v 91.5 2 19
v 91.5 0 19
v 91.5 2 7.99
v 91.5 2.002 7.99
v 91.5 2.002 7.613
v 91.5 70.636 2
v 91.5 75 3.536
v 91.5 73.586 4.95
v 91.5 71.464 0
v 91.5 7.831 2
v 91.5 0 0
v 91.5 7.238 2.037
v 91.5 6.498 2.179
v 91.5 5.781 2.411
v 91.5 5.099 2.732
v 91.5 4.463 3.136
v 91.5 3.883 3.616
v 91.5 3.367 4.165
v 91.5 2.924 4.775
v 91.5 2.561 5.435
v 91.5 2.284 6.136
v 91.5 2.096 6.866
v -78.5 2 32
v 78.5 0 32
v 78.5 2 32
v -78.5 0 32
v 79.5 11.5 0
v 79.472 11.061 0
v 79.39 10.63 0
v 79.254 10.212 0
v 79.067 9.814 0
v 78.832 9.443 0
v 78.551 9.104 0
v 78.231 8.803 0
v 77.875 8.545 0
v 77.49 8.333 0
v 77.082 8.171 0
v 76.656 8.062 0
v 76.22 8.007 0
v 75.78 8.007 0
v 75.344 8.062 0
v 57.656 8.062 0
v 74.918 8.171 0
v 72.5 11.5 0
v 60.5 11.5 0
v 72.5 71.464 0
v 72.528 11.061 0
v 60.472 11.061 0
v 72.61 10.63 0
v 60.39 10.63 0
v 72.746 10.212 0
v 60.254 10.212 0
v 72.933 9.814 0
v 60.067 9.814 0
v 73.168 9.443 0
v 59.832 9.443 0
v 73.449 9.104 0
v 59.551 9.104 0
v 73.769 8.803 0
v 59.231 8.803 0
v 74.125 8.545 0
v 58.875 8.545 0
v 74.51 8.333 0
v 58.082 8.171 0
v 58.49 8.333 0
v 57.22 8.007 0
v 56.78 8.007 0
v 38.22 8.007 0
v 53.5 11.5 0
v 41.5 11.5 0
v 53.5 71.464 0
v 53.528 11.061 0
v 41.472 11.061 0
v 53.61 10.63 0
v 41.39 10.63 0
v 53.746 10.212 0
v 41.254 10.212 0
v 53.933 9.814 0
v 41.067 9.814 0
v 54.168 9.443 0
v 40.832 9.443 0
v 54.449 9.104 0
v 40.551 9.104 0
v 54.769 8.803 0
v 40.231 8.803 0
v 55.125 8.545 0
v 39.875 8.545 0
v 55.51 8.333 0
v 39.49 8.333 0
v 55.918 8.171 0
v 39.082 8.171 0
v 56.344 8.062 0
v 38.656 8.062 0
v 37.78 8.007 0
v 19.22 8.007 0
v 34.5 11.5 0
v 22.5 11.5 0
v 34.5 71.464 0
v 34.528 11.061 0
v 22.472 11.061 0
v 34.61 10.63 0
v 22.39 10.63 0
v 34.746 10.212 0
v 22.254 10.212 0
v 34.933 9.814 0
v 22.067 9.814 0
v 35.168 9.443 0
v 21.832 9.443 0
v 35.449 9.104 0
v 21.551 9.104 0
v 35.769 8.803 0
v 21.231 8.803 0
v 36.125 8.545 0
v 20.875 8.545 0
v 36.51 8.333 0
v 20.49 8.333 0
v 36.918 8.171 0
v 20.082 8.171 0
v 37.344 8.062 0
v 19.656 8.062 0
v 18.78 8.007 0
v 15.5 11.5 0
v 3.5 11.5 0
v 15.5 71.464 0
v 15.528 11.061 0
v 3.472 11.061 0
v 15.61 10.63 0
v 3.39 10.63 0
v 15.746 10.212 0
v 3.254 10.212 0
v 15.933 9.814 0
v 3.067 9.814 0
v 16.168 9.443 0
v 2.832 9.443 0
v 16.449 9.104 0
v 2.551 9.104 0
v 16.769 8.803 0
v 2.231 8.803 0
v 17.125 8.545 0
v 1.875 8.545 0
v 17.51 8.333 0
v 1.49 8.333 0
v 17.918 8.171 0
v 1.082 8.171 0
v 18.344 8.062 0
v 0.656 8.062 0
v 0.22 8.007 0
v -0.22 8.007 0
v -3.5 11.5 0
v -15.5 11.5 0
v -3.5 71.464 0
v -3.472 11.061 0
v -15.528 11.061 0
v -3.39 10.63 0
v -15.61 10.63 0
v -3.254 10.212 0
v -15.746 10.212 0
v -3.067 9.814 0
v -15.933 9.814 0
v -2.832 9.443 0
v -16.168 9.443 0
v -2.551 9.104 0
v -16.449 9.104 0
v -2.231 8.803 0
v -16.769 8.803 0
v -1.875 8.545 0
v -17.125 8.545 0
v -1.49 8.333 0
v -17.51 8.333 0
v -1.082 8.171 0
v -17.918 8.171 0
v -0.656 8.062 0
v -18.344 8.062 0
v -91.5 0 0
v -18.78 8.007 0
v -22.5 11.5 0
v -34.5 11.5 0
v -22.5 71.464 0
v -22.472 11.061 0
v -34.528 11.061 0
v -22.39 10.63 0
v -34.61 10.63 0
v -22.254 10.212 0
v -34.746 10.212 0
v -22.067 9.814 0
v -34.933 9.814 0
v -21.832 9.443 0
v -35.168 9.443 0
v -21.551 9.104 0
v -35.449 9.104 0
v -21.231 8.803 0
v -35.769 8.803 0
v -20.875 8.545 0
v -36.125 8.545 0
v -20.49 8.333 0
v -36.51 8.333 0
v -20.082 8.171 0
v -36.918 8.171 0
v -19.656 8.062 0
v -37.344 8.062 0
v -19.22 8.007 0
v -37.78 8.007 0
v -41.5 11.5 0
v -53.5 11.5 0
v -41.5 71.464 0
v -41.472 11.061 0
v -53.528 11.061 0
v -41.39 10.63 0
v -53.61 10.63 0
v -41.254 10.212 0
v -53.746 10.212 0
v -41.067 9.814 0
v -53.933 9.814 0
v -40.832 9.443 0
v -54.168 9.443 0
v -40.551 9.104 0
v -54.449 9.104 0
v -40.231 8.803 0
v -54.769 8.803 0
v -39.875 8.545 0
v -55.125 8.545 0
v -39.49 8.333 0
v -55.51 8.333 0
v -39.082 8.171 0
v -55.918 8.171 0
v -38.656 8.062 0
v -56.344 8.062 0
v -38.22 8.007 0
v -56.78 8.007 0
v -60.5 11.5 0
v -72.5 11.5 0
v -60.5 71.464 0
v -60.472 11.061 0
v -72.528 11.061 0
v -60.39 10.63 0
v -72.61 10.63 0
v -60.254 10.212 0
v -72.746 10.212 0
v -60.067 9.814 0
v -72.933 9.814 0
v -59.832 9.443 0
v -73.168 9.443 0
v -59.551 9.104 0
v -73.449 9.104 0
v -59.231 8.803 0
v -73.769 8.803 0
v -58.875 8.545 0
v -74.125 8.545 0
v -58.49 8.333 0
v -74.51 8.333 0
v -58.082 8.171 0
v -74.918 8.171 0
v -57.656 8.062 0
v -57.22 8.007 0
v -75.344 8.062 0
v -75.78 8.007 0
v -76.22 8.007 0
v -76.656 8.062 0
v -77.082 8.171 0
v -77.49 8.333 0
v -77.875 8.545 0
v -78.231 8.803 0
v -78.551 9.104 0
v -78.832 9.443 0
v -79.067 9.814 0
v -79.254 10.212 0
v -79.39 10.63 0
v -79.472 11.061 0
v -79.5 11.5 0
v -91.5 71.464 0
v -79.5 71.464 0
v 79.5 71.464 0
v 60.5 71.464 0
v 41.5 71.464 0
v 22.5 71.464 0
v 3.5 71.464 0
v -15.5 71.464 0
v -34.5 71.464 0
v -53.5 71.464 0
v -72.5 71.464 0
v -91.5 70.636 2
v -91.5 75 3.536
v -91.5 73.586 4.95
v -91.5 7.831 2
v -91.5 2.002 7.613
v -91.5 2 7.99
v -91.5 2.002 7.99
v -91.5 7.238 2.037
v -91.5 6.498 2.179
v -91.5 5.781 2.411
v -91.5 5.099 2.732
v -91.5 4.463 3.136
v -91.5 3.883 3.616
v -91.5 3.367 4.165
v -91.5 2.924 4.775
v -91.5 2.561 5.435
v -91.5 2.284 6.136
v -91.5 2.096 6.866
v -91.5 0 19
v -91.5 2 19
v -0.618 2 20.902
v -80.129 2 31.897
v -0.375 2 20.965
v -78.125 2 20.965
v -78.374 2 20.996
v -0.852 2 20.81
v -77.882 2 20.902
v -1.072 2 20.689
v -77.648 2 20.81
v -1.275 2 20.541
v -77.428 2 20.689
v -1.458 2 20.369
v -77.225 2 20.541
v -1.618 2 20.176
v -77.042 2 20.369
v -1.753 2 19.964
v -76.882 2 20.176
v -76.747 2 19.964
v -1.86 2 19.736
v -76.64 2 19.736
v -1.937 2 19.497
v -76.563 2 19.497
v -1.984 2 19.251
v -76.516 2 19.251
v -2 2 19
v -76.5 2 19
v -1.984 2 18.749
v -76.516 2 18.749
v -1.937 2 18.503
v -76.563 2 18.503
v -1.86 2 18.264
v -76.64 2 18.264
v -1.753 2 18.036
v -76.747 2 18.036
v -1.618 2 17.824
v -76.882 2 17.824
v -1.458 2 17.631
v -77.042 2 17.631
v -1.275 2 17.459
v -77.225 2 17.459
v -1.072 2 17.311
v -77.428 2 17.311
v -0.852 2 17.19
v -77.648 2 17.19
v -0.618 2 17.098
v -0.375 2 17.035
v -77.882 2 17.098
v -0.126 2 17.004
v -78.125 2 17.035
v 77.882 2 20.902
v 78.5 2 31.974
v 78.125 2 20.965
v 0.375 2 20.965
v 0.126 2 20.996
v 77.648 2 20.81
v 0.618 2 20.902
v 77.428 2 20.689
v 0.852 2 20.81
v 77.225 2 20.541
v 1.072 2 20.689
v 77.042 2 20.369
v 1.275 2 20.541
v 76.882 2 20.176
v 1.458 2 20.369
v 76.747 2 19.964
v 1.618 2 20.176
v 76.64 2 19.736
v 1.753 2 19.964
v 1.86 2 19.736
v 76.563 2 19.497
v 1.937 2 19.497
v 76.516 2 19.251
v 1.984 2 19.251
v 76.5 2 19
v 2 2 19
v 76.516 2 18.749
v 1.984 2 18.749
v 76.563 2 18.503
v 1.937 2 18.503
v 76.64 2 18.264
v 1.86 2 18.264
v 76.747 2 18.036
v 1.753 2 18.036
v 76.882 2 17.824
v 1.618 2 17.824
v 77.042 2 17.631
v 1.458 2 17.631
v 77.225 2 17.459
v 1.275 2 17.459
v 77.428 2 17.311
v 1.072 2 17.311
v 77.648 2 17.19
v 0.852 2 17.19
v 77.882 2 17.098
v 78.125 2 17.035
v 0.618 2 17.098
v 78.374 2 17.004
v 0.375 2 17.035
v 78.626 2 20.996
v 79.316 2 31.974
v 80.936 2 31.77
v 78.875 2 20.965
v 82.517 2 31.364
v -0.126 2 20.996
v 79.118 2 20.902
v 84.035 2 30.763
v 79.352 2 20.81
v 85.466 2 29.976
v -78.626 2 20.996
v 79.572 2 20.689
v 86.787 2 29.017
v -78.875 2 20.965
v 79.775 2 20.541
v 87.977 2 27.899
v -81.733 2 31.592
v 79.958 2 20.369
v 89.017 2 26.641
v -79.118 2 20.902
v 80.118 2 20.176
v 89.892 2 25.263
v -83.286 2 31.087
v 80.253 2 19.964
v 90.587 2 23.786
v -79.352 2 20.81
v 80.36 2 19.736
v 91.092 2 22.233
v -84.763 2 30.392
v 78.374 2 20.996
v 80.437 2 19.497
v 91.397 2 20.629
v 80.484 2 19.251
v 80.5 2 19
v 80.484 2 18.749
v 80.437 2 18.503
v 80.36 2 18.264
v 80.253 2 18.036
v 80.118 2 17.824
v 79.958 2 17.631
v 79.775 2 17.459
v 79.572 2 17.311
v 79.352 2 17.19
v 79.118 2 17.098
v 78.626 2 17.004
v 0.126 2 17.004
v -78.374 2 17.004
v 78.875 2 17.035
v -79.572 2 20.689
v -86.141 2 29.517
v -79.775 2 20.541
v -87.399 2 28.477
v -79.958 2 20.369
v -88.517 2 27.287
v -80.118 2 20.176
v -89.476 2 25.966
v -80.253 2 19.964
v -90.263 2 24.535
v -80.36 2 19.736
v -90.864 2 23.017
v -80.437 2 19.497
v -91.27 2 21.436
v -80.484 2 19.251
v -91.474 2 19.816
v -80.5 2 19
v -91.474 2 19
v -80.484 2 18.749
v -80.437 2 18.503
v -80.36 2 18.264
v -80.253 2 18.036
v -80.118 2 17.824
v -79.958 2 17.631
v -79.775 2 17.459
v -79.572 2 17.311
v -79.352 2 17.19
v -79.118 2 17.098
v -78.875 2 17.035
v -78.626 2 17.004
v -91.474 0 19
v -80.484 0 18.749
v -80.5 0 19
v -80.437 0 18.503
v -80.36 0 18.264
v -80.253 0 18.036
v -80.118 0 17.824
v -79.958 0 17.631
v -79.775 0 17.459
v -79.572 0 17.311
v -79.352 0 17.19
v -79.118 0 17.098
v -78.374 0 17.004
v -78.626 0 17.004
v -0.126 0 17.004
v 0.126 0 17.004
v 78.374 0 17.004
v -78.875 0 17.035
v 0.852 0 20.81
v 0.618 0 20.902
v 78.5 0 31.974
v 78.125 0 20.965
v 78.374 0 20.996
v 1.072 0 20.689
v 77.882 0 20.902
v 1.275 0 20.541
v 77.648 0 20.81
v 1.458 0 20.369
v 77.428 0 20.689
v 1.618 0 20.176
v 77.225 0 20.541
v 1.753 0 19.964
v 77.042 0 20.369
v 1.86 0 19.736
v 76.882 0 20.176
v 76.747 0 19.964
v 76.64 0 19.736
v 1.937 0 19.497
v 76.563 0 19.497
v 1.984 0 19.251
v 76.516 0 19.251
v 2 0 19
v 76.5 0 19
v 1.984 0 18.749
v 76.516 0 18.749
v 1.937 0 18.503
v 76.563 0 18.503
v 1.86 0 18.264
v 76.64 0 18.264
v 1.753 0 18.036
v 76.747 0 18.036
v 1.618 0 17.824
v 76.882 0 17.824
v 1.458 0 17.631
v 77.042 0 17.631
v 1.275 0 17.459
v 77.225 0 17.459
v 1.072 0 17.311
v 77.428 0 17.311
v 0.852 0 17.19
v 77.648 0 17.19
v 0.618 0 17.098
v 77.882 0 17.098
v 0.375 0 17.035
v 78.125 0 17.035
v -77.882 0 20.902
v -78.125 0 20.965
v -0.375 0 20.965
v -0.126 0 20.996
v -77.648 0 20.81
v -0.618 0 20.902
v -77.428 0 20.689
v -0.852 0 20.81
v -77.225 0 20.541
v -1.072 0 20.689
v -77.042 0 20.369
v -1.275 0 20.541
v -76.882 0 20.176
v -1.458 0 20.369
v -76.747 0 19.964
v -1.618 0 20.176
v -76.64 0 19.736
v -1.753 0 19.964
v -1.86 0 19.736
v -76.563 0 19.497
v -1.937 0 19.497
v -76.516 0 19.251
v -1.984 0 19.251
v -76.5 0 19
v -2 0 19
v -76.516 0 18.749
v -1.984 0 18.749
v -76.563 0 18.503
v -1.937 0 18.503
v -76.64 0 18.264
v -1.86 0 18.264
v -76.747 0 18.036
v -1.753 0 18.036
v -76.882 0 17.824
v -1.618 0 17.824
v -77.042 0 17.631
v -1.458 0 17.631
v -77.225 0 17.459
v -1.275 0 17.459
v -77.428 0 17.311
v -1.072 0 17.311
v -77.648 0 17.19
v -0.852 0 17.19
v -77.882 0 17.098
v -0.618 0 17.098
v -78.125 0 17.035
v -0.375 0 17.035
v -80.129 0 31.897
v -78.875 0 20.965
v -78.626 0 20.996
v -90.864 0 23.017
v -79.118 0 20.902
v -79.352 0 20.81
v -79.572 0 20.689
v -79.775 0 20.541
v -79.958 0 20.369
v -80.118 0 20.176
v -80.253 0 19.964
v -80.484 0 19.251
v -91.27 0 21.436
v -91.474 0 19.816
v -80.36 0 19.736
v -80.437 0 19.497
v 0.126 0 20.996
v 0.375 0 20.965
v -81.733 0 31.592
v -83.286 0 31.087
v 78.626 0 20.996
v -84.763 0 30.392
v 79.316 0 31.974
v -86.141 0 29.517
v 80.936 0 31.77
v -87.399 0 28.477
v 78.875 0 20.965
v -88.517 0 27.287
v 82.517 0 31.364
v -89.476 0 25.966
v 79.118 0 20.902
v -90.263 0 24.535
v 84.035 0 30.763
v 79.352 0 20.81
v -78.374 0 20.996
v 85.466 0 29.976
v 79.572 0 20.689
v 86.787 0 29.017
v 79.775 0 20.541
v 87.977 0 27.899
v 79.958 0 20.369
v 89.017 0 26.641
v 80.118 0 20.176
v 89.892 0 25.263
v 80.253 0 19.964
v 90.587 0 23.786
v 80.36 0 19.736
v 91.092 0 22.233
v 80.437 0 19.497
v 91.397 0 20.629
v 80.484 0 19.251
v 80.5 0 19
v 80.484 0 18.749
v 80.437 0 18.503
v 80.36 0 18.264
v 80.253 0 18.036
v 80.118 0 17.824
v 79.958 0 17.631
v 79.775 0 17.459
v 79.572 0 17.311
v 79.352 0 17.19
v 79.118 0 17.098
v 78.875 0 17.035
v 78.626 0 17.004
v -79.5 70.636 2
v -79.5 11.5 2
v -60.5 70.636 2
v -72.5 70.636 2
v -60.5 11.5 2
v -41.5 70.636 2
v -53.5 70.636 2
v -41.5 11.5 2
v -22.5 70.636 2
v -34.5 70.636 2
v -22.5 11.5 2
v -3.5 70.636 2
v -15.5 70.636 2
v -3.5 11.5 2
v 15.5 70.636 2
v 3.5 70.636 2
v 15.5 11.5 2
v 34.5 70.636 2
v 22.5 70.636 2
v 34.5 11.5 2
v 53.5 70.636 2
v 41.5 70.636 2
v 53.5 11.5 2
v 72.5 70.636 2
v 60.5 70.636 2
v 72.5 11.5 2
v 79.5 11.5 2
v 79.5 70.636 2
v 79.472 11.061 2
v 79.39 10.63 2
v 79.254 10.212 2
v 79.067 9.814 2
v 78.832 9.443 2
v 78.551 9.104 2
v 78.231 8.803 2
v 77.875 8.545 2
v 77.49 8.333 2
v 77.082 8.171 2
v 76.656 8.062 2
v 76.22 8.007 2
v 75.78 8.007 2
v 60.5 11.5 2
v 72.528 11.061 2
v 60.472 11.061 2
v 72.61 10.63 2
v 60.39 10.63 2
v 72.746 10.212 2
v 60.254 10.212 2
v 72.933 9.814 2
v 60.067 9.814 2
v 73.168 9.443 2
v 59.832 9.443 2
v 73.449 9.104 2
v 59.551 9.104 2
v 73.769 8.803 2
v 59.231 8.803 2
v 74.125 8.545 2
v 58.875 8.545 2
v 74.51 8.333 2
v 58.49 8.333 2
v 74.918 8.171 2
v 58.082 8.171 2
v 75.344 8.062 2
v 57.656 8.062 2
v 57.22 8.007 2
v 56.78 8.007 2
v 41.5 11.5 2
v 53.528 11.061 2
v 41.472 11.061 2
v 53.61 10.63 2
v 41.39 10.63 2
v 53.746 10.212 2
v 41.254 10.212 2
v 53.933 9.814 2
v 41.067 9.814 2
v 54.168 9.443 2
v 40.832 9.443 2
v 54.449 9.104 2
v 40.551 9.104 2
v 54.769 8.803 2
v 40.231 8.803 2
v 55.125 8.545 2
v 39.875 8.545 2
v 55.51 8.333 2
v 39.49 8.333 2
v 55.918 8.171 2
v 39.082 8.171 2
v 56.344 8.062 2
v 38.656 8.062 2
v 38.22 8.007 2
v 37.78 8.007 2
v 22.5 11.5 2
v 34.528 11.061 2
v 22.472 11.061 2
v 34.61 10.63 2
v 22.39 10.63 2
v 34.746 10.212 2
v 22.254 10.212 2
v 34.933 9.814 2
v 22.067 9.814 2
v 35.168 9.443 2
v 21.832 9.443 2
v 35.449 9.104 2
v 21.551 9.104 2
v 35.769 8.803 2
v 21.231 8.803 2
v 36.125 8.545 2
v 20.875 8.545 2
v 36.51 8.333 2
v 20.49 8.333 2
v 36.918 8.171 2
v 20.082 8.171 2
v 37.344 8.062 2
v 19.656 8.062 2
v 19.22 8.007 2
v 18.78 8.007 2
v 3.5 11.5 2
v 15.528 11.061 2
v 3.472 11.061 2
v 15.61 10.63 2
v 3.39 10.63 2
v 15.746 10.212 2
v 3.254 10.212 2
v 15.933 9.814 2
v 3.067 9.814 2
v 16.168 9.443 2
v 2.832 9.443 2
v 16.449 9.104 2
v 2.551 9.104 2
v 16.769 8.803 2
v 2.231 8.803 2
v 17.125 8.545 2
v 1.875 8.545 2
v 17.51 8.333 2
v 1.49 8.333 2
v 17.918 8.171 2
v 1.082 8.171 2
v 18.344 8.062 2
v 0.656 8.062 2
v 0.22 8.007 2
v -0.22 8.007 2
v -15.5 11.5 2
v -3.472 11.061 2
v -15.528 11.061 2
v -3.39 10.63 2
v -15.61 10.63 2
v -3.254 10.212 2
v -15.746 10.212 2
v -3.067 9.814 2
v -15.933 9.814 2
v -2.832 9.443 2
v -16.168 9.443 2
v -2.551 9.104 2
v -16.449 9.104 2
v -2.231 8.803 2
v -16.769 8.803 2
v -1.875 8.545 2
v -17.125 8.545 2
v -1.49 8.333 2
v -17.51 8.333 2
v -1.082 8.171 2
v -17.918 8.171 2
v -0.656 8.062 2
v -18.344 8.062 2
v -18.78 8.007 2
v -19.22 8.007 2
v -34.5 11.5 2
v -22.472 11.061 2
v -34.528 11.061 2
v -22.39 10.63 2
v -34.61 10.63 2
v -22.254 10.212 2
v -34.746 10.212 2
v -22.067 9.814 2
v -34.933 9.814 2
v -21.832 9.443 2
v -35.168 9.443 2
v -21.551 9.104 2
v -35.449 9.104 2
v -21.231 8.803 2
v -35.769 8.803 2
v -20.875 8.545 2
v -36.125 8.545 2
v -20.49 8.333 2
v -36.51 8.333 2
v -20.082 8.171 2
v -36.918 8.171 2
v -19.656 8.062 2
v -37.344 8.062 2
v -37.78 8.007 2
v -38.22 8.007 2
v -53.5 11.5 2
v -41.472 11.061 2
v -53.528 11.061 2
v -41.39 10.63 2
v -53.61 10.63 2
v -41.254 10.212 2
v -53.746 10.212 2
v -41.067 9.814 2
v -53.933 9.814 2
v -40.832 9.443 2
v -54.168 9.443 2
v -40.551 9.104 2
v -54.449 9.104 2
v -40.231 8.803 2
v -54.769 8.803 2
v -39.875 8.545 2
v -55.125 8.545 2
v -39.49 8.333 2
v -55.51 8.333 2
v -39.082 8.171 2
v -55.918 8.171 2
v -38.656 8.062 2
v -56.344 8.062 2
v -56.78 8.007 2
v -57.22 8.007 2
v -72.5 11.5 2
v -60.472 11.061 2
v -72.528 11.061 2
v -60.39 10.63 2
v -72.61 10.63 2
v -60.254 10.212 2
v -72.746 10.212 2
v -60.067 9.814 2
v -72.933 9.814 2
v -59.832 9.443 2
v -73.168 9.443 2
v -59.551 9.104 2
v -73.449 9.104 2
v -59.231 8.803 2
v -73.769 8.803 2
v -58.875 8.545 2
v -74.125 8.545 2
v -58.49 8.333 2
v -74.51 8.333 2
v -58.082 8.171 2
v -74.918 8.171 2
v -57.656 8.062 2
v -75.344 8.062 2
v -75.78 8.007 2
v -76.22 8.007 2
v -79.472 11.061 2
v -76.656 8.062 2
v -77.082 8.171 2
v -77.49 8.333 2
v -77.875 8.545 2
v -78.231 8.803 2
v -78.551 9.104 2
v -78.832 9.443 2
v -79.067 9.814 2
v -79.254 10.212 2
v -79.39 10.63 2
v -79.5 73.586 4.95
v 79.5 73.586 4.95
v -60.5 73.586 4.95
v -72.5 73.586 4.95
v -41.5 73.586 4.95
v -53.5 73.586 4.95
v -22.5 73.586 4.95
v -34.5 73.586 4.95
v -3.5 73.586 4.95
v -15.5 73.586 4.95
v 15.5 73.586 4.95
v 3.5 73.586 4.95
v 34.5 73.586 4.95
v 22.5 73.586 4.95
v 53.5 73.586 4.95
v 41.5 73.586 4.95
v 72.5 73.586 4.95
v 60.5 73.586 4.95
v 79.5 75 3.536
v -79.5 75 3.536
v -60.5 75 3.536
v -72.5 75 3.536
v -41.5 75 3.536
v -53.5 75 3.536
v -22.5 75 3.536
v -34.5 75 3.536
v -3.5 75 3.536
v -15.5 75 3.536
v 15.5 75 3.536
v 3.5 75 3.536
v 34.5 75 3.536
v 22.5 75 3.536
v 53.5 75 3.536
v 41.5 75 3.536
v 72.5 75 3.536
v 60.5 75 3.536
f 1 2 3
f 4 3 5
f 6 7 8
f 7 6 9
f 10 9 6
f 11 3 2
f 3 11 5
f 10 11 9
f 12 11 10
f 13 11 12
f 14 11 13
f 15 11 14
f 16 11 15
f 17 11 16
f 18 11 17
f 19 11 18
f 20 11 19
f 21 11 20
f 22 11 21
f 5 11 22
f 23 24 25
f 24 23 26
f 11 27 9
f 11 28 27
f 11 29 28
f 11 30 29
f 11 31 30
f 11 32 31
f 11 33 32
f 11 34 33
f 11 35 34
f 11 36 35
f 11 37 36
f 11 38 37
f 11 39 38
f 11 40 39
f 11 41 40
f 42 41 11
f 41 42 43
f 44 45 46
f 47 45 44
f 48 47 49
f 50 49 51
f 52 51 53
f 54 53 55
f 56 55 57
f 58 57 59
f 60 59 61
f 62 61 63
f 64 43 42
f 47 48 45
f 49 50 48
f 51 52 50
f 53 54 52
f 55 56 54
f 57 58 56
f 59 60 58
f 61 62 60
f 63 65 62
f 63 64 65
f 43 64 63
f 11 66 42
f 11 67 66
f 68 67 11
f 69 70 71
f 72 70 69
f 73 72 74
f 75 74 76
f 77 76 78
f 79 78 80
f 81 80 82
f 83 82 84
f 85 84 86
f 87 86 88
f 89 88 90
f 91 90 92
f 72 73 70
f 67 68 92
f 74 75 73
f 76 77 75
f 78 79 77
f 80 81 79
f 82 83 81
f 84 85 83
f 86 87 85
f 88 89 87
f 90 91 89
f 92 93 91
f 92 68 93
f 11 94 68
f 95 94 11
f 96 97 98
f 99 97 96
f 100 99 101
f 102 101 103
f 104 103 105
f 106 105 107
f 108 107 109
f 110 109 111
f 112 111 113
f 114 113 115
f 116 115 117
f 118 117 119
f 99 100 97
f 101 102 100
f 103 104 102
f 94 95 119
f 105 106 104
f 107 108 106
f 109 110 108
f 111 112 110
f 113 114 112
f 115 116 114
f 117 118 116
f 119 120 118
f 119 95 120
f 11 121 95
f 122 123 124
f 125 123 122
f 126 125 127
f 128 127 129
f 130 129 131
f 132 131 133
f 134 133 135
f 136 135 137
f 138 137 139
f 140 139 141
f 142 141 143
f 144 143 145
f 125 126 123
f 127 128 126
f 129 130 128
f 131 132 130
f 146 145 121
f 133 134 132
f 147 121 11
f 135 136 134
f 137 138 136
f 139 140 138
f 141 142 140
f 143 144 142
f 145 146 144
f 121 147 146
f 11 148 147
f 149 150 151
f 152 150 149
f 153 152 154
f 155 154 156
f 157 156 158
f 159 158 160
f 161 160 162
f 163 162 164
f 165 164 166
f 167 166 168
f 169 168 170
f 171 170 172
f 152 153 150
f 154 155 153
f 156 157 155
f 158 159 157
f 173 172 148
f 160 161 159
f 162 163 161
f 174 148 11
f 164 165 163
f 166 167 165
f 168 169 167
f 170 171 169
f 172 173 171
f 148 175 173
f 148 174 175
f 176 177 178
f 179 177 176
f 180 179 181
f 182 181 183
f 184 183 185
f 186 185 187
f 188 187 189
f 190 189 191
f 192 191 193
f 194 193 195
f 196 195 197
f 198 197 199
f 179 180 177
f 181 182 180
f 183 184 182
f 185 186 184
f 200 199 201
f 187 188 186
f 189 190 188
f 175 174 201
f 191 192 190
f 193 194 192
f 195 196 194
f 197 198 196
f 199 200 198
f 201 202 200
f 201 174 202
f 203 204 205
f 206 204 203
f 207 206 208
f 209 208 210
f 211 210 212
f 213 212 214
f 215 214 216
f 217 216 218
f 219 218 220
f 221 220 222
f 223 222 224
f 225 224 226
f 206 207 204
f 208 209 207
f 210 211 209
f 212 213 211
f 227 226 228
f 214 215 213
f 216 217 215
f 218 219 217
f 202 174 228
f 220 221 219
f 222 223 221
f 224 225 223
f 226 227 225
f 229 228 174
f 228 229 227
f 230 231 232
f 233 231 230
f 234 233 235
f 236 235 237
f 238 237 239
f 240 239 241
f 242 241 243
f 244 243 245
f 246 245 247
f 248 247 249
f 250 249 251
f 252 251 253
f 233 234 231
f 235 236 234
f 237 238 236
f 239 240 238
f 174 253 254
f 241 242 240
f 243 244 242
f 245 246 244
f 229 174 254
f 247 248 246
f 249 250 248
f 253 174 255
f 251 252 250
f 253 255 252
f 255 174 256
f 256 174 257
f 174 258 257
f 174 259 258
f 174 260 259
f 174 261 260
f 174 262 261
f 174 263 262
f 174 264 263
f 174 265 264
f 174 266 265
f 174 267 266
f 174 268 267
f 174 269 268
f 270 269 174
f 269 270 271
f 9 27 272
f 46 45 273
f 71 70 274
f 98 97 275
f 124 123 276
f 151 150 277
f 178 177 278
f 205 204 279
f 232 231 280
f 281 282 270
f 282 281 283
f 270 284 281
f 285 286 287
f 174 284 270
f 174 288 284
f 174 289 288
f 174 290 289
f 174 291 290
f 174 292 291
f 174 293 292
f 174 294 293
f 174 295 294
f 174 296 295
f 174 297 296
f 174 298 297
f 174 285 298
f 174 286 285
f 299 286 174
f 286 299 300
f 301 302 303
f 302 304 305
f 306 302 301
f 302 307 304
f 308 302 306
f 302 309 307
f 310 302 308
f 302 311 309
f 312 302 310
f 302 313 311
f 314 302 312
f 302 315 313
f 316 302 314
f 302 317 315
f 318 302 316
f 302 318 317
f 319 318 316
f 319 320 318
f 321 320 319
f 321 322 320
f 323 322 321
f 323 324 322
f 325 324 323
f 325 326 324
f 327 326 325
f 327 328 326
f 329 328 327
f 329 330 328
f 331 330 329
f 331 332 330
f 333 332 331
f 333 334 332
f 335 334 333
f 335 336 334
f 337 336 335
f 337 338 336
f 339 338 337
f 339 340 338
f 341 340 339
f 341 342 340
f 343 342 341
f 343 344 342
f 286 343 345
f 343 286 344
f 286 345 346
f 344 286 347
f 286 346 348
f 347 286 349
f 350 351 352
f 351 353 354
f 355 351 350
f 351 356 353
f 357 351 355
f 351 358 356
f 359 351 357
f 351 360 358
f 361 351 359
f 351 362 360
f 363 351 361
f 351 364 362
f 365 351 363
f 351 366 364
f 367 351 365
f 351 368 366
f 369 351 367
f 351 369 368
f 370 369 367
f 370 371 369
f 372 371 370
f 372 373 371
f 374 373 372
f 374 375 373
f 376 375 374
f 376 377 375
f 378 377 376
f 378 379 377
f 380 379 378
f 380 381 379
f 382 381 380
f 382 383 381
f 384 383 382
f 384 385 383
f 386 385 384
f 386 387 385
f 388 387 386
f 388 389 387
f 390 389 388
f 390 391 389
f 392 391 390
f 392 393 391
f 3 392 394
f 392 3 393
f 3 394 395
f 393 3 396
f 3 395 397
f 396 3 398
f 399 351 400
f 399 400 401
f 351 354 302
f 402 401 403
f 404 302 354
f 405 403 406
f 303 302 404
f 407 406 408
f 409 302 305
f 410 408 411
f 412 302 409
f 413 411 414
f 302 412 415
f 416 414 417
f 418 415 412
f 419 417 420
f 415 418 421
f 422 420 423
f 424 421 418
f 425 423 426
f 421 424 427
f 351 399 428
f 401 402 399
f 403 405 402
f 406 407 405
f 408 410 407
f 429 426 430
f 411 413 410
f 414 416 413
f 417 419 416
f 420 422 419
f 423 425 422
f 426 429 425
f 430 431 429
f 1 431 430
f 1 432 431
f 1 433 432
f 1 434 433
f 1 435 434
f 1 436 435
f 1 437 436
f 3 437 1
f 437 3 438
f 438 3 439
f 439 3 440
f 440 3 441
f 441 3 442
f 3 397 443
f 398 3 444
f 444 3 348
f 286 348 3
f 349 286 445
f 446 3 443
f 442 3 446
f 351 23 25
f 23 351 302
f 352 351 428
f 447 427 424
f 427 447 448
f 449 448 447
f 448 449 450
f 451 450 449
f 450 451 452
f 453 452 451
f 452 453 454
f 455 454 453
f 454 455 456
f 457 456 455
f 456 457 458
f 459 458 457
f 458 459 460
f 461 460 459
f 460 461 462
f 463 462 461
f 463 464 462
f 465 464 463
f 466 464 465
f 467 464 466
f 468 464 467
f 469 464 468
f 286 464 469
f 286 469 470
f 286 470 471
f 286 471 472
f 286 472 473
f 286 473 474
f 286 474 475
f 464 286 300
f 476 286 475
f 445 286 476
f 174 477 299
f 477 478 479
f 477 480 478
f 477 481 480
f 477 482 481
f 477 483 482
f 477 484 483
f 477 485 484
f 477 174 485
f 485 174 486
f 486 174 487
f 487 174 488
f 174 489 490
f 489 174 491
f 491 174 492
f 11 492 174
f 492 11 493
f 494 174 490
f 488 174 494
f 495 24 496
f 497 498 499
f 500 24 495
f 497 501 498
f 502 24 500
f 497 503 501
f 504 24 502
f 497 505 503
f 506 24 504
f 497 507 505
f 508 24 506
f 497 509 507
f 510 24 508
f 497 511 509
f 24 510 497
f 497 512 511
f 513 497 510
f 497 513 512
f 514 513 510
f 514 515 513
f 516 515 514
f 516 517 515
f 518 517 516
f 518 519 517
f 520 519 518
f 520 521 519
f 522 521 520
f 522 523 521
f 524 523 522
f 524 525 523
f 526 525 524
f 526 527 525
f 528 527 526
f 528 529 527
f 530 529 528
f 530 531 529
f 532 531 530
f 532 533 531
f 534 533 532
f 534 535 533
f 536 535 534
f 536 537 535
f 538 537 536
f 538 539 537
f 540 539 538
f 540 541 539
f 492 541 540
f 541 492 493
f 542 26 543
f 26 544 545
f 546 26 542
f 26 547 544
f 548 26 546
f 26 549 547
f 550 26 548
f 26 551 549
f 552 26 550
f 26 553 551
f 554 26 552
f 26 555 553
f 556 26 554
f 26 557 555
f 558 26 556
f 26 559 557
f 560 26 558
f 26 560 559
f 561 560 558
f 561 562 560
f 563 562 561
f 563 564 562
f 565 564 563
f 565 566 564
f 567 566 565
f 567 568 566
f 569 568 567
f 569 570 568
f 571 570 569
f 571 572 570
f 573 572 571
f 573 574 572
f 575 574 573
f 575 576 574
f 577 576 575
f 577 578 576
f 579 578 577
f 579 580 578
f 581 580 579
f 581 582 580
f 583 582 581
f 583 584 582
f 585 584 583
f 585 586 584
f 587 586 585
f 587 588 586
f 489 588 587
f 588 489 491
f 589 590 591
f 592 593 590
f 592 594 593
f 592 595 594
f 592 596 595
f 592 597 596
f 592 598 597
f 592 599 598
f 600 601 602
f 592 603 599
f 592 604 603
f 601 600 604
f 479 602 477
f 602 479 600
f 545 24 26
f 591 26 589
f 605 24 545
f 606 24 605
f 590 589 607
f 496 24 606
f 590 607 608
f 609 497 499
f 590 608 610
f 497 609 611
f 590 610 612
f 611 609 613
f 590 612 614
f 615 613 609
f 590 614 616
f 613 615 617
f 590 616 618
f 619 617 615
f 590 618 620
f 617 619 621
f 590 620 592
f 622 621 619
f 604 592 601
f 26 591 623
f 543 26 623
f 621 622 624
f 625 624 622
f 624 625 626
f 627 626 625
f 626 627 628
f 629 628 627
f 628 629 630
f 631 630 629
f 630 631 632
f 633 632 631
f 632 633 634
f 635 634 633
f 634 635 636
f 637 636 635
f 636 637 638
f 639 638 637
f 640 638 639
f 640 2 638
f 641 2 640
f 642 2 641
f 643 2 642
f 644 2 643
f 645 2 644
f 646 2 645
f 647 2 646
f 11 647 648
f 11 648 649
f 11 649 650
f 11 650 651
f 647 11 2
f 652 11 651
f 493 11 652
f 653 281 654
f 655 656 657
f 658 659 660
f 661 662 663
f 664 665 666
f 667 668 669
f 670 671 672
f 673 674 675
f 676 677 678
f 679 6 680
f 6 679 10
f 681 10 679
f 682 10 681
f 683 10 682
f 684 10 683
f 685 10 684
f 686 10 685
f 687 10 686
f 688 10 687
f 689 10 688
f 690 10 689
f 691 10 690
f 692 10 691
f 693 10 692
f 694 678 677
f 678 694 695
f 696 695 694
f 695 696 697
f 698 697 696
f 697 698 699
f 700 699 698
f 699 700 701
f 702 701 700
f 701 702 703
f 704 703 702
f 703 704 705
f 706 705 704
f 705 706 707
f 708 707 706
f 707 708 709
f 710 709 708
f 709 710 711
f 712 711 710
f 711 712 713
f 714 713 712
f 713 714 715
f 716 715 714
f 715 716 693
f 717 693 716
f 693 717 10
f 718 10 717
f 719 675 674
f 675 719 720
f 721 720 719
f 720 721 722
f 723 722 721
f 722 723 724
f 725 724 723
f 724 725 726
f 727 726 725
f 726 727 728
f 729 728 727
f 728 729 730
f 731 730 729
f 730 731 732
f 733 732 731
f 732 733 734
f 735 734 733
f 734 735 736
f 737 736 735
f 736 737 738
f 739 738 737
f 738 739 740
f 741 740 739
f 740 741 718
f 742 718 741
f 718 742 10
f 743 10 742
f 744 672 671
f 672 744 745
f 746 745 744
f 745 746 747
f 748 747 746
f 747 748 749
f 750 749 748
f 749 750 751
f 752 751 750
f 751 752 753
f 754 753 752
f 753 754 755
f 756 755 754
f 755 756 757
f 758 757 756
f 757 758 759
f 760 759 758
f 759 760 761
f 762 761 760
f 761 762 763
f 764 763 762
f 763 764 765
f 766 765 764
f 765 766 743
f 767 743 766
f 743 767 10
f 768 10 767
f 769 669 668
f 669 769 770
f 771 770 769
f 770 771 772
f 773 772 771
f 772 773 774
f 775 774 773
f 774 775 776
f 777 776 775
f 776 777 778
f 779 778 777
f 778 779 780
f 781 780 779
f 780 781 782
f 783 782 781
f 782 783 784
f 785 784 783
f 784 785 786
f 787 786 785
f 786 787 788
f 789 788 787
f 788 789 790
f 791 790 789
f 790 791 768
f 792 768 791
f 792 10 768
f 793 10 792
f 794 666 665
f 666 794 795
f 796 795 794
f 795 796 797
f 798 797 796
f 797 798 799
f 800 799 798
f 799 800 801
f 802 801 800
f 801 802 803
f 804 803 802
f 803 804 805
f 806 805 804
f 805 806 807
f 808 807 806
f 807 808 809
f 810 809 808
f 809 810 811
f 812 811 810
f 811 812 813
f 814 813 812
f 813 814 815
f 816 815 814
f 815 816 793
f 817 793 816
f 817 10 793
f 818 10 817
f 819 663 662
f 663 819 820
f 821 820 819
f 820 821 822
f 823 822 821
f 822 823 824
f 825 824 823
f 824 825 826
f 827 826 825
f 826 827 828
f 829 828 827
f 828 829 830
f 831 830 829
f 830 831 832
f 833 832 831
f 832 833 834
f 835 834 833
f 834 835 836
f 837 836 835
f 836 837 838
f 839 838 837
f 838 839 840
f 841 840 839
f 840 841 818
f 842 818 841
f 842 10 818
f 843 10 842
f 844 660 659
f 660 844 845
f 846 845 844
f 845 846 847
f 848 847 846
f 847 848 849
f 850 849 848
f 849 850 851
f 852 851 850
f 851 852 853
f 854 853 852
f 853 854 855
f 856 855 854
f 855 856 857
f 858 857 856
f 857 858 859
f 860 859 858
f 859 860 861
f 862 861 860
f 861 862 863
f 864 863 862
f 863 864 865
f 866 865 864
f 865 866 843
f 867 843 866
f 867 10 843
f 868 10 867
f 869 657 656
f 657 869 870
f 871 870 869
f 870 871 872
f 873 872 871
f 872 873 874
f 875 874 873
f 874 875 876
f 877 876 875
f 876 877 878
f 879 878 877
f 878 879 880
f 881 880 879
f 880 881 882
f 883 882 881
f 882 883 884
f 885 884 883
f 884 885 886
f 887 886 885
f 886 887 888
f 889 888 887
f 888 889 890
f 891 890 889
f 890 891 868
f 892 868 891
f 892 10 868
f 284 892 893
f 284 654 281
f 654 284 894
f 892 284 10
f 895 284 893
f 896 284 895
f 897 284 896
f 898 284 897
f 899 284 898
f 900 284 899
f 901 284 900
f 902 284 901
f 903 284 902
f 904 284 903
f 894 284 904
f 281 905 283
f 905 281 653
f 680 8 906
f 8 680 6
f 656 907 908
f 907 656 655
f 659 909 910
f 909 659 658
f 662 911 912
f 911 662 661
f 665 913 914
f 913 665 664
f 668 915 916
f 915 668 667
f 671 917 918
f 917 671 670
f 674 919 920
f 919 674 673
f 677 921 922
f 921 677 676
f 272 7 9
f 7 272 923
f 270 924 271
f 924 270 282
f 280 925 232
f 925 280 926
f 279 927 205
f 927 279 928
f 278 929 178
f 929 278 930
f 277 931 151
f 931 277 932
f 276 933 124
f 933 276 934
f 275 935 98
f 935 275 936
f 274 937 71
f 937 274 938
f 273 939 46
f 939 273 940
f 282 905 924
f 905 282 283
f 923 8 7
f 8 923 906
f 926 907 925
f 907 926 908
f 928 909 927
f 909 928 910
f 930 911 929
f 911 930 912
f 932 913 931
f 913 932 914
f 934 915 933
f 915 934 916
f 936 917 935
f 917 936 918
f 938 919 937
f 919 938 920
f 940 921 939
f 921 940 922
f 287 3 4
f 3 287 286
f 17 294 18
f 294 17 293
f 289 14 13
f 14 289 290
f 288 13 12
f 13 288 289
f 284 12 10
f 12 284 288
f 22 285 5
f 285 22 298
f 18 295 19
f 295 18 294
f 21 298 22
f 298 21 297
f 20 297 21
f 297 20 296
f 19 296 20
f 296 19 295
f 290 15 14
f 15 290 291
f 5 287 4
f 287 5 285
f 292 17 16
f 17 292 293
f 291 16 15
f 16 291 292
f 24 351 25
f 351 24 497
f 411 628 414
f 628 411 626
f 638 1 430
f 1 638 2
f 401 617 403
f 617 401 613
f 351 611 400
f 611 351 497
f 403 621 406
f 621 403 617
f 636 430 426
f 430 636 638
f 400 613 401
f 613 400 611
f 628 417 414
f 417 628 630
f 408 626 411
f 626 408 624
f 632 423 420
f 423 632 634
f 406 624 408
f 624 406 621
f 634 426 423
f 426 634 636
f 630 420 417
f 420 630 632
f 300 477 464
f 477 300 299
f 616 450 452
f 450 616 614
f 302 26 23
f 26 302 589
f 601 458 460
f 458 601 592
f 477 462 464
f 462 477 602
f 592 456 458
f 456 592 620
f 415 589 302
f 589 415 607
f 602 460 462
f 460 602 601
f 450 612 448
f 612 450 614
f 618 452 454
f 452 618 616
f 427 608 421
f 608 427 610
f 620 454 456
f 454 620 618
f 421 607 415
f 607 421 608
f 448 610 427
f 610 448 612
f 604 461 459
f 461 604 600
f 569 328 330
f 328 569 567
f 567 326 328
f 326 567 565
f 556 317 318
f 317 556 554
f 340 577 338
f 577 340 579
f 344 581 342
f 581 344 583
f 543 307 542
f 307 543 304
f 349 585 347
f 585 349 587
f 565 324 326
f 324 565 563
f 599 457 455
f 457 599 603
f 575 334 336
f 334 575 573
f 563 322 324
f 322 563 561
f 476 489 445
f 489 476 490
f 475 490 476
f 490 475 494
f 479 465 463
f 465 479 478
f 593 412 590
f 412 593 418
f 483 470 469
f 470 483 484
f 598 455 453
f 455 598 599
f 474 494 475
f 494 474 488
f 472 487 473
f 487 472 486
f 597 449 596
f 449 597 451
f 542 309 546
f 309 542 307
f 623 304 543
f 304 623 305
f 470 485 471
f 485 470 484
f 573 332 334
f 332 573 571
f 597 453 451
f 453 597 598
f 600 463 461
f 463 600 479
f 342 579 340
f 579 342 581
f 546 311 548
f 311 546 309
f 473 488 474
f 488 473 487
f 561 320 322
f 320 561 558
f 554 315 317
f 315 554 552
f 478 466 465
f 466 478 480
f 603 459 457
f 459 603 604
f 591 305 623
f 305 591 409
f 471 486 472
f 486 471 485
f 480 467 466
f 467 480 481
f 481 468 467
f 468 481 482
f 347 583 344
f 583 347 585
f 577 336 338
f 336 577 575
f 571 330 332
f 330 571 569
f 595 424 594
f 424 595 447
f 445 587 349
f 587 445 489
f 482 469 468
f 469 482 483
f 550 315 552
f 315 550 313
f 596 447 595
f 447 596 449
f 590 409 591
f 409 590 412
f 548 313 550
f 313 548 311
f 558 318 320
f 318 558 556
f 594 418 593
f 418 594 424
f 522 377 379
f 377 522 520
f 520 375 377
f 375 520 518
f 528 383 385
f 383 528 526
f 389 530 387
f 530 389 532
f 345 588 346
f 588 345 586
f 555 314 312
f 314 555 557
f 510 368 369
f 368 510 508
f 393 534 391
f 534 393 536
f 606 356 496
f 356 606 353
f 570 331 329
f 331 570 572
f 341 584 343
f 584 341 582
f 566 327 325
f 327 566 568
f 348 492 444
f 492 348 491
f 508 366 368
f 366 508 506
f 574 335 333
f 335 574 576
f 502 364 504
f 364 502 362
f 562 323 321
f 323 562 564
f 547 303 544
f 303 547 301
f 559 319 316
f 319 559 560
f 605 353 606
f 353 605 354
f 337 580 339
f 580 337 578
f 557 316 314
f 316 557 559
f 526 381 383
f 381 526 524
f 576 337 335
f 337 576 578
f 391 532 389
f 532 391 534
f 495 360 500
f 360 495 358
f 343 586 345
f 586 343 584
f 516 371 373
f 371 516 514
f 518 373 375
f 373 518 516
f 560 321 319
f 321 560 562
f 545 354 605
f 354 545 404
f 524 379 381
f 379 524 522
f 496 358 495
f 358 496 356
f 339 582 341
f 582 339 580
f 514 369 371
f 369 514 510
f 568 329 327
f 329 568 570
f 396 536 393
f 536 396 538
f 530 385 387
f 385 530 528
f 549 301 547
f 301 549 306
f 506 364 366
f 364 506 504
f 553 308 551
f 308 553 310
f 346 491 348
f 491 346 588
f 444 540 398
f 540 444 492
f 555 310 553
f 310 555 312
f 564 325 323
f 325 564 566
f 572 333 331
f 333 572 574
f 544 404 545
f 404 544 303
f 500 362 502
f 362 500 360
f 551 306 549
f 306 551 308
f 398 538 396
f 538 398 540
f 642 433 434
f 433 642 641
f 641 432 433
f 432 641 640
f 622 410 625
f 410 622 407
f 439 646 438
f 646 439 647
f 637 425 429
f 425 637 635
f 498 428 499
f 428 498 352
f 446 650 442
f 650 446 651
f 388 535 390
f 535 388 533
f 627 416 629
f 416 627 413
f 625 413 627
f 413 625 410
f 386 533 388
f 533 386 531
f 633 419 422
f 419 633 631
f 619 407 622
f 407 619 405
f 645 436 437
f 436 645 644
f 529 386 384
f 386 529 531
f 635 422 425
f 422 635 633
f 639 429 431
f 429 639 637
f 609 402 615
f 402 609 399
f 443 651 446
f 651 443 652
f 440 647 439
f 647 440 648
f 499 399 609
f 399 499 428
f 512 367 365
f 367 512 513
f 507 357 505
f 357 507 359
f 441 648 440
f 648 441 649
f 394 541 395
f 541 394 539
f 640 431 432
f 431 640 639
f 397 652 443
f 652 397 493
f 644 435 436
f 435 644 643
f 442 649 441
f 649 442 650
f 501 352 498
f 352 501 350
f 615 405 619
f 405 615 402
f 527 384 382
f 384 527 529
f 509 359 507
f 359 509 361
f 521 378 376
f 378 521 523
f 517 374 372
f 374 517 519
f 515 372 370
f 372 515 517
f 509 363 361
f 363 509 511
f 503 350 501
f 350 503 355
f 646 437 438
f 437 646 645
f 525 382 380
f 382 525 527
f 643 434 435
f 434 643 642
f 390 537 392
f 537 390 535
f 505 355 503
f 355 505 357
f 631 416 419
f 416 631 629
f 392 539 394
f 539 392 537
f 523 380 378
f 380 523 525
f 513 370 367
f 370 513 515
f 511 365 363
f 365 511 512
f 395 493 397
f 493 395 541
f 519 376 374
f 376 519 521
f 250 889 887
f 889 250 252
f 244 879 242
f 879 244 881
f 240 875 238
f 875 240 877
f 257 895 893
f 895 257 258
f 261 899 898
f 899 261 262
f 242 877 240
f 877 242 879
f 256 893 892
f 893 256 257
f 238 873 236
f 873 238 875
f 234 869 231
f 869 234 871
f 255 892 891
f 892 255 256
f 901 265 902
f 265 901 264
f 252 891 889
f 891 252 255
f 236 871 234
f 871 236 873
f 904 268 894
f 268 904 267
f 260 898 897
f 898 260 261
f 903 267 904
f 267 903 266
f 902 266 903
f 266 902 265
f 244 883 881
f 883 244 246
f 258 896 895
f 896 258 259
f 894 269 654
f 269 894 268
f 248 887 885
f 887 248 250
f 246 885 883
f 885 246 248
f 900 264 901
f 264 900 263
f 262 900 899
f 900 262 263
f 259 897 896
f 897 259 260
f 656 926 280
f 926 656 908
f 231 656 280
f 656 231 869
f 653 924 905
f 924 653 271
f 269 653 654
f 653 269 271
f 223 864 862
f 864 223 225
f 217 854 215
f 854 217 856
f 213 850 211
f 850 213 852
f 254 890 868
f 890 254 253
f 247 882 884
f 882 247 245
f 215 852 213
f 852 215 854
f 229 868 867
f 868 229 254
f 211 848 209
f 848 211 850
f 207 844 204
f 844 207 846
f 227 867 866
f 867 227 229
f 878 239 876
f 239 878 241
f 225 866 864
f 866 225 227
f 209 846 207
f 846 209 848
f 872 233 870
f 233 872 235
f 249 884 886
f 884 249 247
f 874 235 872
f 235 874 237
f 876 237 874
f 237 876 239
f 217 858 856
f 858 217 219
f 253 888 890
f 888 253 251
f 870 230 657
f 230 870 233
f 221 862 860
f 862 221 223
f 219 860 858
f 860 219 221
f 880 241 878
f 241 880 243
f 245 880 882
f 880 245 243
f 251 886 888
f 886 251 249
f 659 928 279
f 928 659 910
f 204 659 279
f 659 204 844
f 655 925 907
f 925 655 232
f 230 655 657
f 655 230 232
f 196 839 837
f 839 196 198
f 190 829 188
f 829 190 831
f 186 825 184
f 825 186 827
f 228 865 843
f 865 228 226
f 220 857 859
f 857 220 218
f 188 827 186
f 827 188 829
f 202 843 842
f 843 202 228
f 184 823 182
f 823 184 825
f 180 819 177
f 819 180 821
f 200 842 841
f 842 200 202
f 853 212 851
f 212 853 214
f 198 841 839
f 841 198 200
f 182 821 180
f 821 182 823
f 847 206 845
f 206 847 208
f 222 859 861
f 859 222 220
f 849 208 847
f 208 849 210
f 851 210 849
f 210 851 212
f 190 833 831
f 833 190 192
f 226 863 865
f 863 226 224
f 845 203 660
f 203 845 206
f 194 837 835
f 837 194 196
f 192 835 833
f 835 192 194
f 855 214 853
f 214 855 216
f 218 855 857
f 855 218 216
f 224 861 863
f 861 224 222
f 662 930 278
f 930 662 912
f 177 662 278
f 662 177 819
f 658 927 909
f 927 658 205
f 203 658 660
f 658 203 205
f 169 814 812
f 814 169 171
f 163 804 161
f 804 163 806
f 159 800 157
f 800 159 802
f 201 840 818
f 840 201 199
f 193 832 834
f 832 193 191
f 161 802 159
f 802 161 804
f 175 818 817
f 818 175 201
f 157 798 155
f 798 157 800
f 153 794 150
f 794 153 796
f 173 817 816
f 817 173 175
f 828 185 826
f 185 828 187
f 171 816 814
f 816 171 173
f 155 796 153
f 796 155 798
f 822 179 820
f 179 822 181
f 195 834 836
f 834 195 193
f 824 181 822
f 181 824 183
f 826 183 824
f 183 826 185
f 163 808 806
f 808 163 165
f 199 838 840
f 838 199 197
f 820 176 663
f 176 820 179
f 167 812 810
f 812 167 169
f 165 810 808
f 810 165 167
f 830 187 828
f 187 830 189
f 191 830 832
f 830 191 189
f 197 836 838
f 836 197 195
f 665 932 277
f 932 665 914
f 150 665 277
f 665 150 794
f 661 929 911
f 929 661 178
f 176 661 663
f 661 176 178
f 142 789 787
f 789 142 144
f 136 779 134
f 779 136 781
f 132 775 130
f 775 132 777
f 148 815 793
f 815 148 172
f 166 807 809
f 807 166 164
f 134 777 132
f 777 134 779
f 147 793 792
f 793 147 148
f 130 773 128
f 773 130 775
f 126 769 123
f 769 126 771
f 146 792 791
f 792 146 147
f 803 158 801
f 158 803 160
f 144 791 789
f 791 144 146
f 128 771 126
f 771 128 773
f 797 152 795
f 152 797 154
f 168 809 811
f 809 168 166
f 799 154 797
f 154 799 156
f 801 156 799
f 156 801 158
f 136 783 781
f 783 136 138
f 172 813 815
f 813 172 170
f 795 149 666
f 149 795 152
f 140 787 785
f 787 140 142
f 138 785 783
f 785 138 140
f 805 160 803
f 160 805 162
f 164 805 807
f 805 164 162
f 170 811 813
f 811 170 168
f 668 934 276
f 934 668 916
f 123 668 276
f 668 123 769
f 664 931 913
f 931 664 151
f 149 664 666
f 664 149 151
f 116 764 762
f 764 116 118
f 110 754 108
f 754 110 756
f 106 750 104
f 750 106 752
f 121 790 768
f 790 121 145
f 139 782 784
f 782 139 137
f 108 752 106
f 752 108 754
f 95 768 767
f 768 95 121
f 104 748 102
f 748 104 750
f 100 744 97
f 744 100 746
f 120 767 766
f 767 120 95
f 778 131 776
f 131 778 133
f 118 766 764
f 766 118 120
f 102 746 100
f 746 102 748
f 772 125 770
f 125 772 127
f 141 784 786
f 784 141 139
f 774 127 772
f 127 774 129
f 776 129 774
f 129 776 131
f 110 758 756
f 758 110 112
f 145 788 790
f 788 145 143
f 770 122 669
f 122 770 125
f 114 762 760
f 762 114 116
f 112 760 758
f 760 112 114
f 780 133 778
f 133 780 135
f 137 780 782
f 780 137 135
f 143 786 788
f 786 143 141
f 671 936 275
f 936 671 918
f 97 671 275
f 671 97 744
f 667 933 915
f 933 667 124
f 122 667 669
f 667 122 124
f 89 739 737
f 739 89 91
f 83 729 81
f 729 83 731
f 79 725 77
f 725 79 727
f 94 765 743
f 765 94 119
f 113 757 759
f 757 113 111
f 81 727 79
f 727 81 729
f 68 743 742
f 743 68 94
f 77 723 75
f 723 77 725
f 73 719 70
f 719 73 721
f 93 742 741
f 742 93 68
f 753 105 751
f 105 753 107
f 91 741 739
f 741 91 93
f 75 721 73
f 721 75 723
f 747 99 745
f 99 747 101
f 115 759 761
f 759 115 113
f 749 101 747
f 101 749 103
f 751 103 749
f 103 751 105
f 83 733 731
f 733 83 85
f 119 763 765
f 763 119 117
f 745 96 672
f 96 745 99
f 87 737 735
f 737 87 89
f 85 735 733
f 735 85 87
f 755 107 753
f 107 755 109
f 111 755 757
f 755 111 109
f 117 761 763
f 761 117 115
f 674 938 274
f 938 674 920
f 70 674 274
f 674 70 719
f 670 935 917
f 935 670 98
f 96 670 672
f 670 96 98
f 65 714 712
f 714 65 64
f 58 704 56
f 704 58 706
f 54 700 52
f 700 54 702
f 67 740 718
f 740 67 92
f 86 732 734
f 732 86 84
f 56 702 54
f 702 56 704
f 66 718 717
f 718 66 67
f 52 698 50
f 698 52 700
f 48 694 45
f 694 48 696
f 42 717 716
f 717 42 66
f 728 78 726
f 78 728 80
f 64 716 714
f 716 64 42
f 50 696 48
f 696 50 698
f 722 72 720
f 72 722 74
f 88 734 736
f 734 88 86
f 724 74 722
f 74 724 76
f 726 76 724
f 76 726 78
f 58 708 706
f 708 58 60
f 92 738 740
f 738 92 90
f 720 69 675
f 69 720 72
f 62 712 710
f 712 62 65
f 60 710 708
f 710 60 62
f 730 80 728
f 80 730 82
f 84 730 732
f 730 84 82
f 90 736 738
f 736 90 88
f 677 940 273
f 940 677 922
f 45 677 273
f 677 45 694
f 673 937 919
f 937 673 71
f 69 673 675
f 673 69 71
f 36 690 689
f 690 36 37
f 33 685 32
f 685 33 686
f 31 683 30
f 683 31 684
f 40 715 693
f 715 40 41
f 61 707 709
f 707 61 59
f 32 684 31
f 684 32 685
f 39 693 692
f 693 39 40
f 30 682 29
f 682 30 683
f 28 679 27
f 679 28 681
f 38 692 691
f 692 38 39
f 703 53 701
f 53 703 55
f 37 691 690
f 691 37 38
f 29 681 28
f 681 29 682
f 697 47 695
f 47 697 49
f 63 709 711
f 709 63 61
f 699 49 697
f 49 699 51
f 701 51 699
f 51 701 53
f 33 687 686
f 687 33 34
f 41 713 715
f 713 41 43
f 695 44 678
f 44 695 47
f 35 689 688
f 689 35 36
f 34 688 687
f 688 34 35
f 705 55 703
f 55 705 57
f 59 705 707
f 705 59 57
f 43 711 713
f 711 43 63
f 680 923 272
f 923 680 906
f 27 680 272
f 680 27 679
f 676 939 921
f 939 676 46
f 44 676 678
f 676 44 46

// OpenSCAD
// Height of back plate
Height = 32;
// Thickness of back plate
BackThickness = 2;
// Total distance from back plate to tip of arms
Depth = 75;
// Fillet between back plate and arms for strength
FilletRadius = 6;

// Vertical thickness of Arms/Prongs
ArmThickness = 2;
// Arm Width
ArmWidth = 12;
// How much end of arm is angled above horizontal
AngleDegrees = 45;
// Length of angled portion of arms
AngledLength = 5;
// Gap between arms
SlotWidth = 7;
// How many slot for holding leads
SlotCount = 9;
// Detail
$fn = 50;

// Bolt/Screw hole style, none for adhesive mounting
HoleStyle = 1; // [0:None,1:Circular,2:Keyhole]
// Bolt thread outer diameter
BoltDiameter = 4;
// Only for "Keyhole" style
BoltHeadDiameter = 8;
// Number of mounting holes
BoltCount = 3; // [2:8]

TotalLength = SlotCount * SlotWidth + ArmWidth * (SlotCount + 1);
HoleInset = (Height - FilletRadius) / 2;
DepthLessAngle = Depth - AngledLength * cos(AngleDegrees);


module KeyHole(dlarge,dsmall,depth) {
  err = 0.01; // avoid coincident faces
  translate([0,0,-err/2]) {
    cylinder(h=depth + err,d=dsmall);
    translate([0,dlarge,0]) cylinder(h=depth + err,d=dlarge);
    translate([0,dlarge / 2, (depth + err) / 2]) cube([dsmall, dlarge, depth + err], center = true);
  }
}

module insidefillet(r, length) {
  err = 0.01;
  difference () {
   translate([0,r/2,r/2]) cube([length,r,r], center=true);
   translate([0,r,r]) rotate([0,90,0]) cylinder(h=length+2*err, r=r, center=true);
  }
}

module outsidefillet(r, length) {
  err = 0.01;
  translate([length / 2,0,0])
  difference () {
   translate([0,r,r]) cube([length+err,r*2,r*2], center=true);
   rotate([0,90,0]) cylinder(h=length+2*err, r=r, center=true);
  }
}

err = 0.01;
difference() {
  union() {
    translate([-TotalLength/2,0,0]) {
      cube([TotalLength,BackThickness,Height]);
      cube([TotalLength, DepthLessAngle, ArmThickness]);
      translate([0,DepthLessAngle]) rotate([AngleDegrees,0,0]) 
        cube([TotalLength, AngledLength, ArmThickness]);
    }
    translate([0,BackThickness-err,ArmThickness-err]) insidefillet(FilletRadius, TotalLength);
  }
  translate([TotalLength / 2 - HoleInset, 0, Height - HoleInset]) rotate([90,0,90]) 
    outsidefillet(HoleInset, BackThickness + err);
  translate([-TotalLength / 2 + HoleInset, 0, Height - HoleInset]) rotate([0,0,90]) 
    outsidefillet(HoleInset, BackThickness + err);
  
  totalBoltDistance = TotalLength - HoleInset * 2;
  for (offset = [0: totalBoltDistance / (BoltCount - 1): totalBoltDistance]) {
    if (HoleStyle == 2)
      translate([-TotalLength / 2 + HoleInset + offset, 0, Height - HoleInset]) rotate([-90,0,0]) 
        KeyHole(BoltHeadDiameter, BoltDiameter, BackThickness+FilletRadius*2);
    else if (HoleStyle == 1)
      translate([-TotalLength / 2 + HoleInset + offset, -err, Height - HoleInset]) rotate([-90,0,0]) 
        cylinder(h = BackThickness + err * 2, d = BoltDiameter);
  }
  
  for(i = [1:SlotCount]) {
    translate([-TotalLength / 2 + ArmWidth + (i-1) * (ArmWidth + SlotWidth), BackThickness + FilletRadius + SlotWidth / 2, -err])
    union() {  
      translate([SlotWidth/2, 0, 0]) cylinder(h = ArmThickness + AngledLength + err*2, d = SlotWidth);
      cube([SlotWidth, Depth, ArmThickness + AngledLength + err*2]);
    }
  }
}
